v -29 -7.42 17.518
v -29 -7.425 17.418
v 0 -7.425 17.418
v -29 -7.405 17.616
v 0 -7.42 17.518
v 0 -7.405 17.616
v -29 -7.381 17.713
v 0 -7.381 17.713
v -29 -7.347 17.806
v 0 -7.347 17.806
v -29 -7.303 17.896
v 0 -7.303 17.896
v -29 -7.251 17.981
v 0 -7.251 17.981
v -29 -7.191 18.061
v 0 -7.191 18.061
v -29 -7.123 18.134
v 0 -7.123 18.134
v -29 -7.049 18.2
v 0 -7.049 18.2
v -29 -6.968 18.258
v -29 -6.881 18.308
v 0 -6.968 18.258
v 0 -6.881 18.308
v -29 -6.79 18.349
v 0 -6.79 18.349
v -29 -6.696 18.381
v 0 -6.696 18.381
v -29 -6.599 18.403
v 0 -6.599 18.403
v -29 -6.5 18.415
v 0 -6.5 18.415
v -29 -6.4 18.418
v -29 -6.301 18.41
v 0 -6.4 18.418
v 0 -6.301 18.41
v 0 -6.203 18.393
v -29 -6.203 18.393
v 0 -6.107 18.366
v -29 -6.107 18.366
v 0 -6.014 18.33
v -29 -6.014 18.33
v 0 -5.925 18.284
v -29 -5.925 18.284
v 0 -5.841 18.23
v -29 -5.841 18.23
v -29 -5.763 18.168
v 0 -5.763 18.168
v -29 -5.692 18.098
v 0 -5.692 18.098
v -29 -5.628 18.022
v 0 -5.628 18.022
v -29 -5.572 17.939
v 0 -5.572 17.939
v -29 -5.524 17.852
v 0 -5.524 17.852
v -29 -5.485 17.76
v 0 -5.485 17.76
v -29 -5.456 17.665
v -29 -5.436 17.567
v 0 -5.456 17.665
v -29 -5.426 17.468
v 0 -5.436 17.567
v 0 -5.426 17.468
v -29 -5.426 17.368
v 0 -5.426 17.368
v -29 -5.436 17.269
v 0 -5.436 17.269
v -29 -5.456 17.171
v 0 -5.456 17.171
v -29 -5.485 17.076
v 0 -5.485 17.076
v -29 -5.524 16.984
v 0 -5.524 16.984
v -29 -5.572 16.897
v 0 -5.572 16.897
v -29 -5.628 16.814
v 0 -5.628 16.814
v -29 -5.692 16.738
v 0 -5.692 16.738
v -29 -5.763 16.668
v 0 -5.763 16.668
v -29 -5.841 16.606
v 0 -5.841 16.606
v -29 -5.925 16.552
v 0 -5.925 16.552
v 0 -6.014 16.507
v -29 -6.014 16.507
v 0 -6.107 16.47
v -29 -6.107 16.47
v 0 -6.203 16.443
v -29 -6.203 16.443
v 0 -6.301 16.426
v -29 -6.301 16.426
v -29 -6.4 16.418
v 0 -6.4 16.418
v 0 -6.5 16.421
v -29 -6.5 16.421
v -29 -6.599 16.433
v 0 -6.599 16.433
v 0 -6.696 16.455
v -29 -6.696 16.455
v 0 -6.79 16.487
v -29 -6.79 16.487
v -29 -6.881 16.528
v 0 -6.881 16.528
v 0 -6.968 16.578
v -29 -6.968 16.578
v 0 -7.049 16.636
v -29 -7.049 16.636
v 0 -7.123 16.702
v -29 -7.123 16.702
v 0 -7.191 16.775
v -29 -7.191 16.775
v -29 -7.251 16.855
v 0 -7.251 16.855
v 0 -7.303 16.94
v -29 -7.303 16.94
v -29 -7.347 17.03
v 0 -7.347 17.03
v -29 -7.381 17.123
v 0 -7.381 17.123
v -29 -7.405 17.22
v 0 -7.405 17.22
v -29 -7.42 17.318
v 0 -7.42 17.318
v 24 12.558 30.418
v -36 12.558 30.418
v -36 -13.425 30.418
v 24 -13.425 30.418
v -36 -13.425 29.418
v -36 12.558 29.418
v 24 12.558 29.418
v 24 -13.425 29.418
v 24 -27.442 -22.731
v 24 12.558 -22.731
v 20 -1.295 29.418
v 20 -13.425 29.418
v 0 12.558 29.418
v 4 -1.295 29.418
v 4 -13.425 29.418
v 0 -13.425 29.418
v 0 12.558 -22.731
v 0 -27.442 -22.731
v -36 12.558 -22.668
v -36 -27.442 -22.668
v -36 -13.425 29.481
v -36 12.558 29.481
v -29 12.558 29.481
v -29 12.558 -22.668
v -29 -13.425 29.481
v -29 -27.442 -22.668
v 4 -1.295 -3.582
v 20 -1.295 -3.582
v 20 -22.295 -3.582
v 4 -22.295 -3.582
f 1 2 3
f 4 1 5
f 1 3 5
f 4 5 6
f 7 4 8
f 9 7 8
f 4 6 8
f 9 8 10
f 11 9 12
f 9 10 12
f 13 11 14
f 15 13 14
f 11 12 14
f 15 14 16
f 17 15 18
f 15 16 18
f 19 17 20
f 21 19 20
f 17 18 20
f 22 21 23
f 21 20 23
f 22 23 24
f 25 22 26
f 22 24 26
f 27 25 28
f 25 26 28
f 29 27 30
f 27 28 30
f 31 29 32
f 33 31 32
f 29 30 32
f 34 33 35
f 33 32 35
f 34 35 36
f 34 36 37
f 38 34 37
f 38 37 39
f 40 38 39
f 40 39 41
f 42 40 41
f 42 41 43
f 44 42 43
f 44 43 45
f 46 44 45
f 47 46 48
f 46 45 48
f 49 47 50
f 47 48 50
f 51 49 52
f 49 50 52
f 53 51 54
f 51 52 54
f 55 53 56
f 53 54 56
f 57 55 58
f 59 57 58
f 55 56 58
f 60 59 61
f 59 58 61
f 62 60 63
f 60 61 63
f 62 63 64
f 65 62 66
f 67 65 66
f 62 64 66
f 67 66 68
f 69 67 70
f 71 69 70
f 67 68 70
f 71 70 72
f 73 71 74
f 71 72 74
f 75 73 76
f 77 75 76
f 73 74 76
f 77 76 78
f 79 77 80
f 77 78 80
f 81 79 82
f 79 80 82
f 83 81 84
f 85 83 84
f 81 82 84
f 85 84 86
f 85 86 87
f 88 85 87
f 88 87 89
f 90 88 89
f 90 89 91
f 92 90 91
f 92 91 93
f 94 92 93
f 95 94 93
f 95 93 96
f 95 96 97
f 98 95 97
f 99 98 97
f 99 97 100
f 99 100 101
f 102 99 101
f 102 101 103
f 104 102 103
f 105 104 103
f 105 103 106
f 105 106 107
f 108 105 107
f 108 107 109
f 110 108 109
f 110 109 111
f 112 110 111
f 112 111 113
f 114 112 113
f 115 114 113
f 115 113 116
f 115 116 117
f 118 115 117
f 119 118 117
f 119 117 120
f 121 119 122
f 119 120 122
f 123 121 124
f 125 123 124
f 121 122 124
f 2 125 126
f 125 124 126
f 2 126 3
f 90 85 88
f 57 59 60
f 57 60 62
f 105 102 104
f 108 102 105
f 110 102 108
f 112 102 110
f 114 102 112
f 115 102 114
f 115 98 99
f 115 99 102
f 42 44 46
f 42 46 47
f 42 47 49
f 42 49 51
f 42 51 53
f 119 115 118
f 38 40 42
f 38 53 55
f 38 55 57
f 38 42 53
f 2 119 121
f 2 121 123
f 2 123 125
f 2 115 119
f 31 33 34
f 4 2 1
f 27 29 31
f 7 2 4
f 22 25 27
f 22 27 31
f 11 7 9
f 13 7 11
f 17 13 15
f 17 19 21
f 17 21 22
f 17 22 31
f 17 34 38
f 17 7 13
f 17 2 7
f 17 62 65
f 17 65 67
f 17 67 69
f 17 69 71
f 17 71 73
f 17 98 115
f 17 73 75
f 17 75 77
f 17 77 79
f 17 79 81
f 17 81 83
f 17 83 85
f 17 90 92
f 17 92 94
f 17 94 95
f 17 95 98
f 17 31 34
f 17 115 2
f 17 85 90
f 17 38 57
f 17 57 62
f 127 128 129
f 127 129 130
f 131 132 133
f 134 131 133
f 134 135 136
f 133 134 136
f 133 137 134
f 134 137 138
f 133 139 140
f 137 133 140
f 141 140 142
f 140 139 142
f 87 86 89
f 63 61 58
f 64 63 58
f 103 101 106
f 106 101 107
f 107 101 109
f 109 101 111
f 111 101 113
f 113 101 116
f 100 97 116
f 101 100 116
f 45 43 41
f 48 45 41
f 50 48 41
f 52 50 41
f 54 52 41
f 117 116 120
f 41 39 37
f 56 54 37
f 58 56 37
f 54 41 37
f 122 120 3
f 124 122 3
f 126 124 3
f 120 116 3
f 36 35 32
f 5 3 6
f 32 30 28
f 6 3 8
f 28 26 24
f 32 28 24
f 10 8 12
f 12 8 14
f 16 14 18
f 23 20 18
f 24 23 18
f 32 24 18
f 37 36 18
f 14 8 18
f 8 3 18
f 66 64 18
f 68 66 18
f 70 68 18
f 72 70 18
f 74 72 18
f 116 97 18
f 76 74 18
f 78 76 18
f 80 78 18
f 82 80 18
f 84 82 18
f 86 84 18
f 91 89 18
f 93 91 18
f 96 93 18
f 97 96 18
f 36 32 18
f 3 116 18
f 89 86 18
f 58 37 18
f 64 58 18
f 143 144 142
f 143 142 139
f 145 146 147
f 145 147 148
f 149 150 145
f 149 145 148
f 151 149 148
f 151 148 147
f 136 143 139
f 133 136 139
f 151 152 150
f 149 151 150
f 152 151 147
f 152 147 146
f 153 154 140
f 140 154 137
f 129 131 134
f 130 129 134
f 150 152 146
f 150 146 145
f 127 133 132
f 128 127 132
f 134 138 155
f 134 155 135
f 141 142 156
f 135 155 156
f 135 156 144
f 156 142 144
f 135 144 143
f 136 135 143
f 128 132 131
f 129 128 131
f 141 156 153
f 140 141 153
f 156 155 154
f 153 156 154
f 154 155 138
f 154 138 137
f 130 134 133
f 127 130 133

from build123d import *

# Parameters (mm, degrees)
F1_DEPTH  = 24
F4_DEPTH  = 8
F7_DEPTH  = 7
F8_R      = 1
F9_DEPTH  = 29
F12_DEPTH = 1


with BuildPart() as f1:
    # F0 (on Right) → F1 (new body)
    with BuildSketch(Plane.YZ):
        Polygon((12.5575875863, -22.7309510559), (12.5575875863, 29.4180095303), (-13.4250692352, 29.4180095303), (-27.4424124137, -22.7309510559), align=None)
    extrude(amount=F1_DEPTH)

    # F3 (on offset) → F4 (cut, symmetric)
    with BuildSketch(Plane.YZ.offset(12)):
        Polygon((-1.2952810225, 29.4180095303), (-13.4250692352, 29.4180095303), (-22.2952810225, -3.5819904697), (-1.2952810225, -3.5819904697), align=None)
    extrude(amount=F4_DEPTH, both=True, mode=Mode.SUBTRACT)


with BuildPart() as f7:
    # F6 (on offset) → F7 (new body)
    with BuildSketch(Plane.YZ.offset(-29)):
        Polygon((12.558, -22.6680714388), (12.558, 29.481), (-13.4250692352, 29.481), (-27.442, -22.6680714388), (-27.4255107312, -22.6680714388), align=None)
    extrude(amount=-F7_DEPTH)


with BuildPart() as f9:
    # F8 (on face) → F9 (new body, through all)
    with BuildSketch(Plane(origin=(0, 0, 0), x_dir=(0, -1, 0), z_dir=(-1, 0, 0))):
        with Locations((6.4250692352, 17.4180095303)):
            Circle(F8_R)
    extrude(amount=F9_DEPTH)


with BuildPart() as f12:
    # F11 (on offset) → F12 (new body)
    with BuildSketch(Plane.XY.offset(29.4180095303)):
        Polygon((0, 12.5575875863), (-36, 12.5575875863), (-36, -13.4250692352), (20, -13.4250692352), (24, -13.4250692352), (24, 12.5575875863), align=None)
    extrude(amount=F12_DEPTH)


solid = Compound([f1.part, f7.part, f9.part, f12.part])
